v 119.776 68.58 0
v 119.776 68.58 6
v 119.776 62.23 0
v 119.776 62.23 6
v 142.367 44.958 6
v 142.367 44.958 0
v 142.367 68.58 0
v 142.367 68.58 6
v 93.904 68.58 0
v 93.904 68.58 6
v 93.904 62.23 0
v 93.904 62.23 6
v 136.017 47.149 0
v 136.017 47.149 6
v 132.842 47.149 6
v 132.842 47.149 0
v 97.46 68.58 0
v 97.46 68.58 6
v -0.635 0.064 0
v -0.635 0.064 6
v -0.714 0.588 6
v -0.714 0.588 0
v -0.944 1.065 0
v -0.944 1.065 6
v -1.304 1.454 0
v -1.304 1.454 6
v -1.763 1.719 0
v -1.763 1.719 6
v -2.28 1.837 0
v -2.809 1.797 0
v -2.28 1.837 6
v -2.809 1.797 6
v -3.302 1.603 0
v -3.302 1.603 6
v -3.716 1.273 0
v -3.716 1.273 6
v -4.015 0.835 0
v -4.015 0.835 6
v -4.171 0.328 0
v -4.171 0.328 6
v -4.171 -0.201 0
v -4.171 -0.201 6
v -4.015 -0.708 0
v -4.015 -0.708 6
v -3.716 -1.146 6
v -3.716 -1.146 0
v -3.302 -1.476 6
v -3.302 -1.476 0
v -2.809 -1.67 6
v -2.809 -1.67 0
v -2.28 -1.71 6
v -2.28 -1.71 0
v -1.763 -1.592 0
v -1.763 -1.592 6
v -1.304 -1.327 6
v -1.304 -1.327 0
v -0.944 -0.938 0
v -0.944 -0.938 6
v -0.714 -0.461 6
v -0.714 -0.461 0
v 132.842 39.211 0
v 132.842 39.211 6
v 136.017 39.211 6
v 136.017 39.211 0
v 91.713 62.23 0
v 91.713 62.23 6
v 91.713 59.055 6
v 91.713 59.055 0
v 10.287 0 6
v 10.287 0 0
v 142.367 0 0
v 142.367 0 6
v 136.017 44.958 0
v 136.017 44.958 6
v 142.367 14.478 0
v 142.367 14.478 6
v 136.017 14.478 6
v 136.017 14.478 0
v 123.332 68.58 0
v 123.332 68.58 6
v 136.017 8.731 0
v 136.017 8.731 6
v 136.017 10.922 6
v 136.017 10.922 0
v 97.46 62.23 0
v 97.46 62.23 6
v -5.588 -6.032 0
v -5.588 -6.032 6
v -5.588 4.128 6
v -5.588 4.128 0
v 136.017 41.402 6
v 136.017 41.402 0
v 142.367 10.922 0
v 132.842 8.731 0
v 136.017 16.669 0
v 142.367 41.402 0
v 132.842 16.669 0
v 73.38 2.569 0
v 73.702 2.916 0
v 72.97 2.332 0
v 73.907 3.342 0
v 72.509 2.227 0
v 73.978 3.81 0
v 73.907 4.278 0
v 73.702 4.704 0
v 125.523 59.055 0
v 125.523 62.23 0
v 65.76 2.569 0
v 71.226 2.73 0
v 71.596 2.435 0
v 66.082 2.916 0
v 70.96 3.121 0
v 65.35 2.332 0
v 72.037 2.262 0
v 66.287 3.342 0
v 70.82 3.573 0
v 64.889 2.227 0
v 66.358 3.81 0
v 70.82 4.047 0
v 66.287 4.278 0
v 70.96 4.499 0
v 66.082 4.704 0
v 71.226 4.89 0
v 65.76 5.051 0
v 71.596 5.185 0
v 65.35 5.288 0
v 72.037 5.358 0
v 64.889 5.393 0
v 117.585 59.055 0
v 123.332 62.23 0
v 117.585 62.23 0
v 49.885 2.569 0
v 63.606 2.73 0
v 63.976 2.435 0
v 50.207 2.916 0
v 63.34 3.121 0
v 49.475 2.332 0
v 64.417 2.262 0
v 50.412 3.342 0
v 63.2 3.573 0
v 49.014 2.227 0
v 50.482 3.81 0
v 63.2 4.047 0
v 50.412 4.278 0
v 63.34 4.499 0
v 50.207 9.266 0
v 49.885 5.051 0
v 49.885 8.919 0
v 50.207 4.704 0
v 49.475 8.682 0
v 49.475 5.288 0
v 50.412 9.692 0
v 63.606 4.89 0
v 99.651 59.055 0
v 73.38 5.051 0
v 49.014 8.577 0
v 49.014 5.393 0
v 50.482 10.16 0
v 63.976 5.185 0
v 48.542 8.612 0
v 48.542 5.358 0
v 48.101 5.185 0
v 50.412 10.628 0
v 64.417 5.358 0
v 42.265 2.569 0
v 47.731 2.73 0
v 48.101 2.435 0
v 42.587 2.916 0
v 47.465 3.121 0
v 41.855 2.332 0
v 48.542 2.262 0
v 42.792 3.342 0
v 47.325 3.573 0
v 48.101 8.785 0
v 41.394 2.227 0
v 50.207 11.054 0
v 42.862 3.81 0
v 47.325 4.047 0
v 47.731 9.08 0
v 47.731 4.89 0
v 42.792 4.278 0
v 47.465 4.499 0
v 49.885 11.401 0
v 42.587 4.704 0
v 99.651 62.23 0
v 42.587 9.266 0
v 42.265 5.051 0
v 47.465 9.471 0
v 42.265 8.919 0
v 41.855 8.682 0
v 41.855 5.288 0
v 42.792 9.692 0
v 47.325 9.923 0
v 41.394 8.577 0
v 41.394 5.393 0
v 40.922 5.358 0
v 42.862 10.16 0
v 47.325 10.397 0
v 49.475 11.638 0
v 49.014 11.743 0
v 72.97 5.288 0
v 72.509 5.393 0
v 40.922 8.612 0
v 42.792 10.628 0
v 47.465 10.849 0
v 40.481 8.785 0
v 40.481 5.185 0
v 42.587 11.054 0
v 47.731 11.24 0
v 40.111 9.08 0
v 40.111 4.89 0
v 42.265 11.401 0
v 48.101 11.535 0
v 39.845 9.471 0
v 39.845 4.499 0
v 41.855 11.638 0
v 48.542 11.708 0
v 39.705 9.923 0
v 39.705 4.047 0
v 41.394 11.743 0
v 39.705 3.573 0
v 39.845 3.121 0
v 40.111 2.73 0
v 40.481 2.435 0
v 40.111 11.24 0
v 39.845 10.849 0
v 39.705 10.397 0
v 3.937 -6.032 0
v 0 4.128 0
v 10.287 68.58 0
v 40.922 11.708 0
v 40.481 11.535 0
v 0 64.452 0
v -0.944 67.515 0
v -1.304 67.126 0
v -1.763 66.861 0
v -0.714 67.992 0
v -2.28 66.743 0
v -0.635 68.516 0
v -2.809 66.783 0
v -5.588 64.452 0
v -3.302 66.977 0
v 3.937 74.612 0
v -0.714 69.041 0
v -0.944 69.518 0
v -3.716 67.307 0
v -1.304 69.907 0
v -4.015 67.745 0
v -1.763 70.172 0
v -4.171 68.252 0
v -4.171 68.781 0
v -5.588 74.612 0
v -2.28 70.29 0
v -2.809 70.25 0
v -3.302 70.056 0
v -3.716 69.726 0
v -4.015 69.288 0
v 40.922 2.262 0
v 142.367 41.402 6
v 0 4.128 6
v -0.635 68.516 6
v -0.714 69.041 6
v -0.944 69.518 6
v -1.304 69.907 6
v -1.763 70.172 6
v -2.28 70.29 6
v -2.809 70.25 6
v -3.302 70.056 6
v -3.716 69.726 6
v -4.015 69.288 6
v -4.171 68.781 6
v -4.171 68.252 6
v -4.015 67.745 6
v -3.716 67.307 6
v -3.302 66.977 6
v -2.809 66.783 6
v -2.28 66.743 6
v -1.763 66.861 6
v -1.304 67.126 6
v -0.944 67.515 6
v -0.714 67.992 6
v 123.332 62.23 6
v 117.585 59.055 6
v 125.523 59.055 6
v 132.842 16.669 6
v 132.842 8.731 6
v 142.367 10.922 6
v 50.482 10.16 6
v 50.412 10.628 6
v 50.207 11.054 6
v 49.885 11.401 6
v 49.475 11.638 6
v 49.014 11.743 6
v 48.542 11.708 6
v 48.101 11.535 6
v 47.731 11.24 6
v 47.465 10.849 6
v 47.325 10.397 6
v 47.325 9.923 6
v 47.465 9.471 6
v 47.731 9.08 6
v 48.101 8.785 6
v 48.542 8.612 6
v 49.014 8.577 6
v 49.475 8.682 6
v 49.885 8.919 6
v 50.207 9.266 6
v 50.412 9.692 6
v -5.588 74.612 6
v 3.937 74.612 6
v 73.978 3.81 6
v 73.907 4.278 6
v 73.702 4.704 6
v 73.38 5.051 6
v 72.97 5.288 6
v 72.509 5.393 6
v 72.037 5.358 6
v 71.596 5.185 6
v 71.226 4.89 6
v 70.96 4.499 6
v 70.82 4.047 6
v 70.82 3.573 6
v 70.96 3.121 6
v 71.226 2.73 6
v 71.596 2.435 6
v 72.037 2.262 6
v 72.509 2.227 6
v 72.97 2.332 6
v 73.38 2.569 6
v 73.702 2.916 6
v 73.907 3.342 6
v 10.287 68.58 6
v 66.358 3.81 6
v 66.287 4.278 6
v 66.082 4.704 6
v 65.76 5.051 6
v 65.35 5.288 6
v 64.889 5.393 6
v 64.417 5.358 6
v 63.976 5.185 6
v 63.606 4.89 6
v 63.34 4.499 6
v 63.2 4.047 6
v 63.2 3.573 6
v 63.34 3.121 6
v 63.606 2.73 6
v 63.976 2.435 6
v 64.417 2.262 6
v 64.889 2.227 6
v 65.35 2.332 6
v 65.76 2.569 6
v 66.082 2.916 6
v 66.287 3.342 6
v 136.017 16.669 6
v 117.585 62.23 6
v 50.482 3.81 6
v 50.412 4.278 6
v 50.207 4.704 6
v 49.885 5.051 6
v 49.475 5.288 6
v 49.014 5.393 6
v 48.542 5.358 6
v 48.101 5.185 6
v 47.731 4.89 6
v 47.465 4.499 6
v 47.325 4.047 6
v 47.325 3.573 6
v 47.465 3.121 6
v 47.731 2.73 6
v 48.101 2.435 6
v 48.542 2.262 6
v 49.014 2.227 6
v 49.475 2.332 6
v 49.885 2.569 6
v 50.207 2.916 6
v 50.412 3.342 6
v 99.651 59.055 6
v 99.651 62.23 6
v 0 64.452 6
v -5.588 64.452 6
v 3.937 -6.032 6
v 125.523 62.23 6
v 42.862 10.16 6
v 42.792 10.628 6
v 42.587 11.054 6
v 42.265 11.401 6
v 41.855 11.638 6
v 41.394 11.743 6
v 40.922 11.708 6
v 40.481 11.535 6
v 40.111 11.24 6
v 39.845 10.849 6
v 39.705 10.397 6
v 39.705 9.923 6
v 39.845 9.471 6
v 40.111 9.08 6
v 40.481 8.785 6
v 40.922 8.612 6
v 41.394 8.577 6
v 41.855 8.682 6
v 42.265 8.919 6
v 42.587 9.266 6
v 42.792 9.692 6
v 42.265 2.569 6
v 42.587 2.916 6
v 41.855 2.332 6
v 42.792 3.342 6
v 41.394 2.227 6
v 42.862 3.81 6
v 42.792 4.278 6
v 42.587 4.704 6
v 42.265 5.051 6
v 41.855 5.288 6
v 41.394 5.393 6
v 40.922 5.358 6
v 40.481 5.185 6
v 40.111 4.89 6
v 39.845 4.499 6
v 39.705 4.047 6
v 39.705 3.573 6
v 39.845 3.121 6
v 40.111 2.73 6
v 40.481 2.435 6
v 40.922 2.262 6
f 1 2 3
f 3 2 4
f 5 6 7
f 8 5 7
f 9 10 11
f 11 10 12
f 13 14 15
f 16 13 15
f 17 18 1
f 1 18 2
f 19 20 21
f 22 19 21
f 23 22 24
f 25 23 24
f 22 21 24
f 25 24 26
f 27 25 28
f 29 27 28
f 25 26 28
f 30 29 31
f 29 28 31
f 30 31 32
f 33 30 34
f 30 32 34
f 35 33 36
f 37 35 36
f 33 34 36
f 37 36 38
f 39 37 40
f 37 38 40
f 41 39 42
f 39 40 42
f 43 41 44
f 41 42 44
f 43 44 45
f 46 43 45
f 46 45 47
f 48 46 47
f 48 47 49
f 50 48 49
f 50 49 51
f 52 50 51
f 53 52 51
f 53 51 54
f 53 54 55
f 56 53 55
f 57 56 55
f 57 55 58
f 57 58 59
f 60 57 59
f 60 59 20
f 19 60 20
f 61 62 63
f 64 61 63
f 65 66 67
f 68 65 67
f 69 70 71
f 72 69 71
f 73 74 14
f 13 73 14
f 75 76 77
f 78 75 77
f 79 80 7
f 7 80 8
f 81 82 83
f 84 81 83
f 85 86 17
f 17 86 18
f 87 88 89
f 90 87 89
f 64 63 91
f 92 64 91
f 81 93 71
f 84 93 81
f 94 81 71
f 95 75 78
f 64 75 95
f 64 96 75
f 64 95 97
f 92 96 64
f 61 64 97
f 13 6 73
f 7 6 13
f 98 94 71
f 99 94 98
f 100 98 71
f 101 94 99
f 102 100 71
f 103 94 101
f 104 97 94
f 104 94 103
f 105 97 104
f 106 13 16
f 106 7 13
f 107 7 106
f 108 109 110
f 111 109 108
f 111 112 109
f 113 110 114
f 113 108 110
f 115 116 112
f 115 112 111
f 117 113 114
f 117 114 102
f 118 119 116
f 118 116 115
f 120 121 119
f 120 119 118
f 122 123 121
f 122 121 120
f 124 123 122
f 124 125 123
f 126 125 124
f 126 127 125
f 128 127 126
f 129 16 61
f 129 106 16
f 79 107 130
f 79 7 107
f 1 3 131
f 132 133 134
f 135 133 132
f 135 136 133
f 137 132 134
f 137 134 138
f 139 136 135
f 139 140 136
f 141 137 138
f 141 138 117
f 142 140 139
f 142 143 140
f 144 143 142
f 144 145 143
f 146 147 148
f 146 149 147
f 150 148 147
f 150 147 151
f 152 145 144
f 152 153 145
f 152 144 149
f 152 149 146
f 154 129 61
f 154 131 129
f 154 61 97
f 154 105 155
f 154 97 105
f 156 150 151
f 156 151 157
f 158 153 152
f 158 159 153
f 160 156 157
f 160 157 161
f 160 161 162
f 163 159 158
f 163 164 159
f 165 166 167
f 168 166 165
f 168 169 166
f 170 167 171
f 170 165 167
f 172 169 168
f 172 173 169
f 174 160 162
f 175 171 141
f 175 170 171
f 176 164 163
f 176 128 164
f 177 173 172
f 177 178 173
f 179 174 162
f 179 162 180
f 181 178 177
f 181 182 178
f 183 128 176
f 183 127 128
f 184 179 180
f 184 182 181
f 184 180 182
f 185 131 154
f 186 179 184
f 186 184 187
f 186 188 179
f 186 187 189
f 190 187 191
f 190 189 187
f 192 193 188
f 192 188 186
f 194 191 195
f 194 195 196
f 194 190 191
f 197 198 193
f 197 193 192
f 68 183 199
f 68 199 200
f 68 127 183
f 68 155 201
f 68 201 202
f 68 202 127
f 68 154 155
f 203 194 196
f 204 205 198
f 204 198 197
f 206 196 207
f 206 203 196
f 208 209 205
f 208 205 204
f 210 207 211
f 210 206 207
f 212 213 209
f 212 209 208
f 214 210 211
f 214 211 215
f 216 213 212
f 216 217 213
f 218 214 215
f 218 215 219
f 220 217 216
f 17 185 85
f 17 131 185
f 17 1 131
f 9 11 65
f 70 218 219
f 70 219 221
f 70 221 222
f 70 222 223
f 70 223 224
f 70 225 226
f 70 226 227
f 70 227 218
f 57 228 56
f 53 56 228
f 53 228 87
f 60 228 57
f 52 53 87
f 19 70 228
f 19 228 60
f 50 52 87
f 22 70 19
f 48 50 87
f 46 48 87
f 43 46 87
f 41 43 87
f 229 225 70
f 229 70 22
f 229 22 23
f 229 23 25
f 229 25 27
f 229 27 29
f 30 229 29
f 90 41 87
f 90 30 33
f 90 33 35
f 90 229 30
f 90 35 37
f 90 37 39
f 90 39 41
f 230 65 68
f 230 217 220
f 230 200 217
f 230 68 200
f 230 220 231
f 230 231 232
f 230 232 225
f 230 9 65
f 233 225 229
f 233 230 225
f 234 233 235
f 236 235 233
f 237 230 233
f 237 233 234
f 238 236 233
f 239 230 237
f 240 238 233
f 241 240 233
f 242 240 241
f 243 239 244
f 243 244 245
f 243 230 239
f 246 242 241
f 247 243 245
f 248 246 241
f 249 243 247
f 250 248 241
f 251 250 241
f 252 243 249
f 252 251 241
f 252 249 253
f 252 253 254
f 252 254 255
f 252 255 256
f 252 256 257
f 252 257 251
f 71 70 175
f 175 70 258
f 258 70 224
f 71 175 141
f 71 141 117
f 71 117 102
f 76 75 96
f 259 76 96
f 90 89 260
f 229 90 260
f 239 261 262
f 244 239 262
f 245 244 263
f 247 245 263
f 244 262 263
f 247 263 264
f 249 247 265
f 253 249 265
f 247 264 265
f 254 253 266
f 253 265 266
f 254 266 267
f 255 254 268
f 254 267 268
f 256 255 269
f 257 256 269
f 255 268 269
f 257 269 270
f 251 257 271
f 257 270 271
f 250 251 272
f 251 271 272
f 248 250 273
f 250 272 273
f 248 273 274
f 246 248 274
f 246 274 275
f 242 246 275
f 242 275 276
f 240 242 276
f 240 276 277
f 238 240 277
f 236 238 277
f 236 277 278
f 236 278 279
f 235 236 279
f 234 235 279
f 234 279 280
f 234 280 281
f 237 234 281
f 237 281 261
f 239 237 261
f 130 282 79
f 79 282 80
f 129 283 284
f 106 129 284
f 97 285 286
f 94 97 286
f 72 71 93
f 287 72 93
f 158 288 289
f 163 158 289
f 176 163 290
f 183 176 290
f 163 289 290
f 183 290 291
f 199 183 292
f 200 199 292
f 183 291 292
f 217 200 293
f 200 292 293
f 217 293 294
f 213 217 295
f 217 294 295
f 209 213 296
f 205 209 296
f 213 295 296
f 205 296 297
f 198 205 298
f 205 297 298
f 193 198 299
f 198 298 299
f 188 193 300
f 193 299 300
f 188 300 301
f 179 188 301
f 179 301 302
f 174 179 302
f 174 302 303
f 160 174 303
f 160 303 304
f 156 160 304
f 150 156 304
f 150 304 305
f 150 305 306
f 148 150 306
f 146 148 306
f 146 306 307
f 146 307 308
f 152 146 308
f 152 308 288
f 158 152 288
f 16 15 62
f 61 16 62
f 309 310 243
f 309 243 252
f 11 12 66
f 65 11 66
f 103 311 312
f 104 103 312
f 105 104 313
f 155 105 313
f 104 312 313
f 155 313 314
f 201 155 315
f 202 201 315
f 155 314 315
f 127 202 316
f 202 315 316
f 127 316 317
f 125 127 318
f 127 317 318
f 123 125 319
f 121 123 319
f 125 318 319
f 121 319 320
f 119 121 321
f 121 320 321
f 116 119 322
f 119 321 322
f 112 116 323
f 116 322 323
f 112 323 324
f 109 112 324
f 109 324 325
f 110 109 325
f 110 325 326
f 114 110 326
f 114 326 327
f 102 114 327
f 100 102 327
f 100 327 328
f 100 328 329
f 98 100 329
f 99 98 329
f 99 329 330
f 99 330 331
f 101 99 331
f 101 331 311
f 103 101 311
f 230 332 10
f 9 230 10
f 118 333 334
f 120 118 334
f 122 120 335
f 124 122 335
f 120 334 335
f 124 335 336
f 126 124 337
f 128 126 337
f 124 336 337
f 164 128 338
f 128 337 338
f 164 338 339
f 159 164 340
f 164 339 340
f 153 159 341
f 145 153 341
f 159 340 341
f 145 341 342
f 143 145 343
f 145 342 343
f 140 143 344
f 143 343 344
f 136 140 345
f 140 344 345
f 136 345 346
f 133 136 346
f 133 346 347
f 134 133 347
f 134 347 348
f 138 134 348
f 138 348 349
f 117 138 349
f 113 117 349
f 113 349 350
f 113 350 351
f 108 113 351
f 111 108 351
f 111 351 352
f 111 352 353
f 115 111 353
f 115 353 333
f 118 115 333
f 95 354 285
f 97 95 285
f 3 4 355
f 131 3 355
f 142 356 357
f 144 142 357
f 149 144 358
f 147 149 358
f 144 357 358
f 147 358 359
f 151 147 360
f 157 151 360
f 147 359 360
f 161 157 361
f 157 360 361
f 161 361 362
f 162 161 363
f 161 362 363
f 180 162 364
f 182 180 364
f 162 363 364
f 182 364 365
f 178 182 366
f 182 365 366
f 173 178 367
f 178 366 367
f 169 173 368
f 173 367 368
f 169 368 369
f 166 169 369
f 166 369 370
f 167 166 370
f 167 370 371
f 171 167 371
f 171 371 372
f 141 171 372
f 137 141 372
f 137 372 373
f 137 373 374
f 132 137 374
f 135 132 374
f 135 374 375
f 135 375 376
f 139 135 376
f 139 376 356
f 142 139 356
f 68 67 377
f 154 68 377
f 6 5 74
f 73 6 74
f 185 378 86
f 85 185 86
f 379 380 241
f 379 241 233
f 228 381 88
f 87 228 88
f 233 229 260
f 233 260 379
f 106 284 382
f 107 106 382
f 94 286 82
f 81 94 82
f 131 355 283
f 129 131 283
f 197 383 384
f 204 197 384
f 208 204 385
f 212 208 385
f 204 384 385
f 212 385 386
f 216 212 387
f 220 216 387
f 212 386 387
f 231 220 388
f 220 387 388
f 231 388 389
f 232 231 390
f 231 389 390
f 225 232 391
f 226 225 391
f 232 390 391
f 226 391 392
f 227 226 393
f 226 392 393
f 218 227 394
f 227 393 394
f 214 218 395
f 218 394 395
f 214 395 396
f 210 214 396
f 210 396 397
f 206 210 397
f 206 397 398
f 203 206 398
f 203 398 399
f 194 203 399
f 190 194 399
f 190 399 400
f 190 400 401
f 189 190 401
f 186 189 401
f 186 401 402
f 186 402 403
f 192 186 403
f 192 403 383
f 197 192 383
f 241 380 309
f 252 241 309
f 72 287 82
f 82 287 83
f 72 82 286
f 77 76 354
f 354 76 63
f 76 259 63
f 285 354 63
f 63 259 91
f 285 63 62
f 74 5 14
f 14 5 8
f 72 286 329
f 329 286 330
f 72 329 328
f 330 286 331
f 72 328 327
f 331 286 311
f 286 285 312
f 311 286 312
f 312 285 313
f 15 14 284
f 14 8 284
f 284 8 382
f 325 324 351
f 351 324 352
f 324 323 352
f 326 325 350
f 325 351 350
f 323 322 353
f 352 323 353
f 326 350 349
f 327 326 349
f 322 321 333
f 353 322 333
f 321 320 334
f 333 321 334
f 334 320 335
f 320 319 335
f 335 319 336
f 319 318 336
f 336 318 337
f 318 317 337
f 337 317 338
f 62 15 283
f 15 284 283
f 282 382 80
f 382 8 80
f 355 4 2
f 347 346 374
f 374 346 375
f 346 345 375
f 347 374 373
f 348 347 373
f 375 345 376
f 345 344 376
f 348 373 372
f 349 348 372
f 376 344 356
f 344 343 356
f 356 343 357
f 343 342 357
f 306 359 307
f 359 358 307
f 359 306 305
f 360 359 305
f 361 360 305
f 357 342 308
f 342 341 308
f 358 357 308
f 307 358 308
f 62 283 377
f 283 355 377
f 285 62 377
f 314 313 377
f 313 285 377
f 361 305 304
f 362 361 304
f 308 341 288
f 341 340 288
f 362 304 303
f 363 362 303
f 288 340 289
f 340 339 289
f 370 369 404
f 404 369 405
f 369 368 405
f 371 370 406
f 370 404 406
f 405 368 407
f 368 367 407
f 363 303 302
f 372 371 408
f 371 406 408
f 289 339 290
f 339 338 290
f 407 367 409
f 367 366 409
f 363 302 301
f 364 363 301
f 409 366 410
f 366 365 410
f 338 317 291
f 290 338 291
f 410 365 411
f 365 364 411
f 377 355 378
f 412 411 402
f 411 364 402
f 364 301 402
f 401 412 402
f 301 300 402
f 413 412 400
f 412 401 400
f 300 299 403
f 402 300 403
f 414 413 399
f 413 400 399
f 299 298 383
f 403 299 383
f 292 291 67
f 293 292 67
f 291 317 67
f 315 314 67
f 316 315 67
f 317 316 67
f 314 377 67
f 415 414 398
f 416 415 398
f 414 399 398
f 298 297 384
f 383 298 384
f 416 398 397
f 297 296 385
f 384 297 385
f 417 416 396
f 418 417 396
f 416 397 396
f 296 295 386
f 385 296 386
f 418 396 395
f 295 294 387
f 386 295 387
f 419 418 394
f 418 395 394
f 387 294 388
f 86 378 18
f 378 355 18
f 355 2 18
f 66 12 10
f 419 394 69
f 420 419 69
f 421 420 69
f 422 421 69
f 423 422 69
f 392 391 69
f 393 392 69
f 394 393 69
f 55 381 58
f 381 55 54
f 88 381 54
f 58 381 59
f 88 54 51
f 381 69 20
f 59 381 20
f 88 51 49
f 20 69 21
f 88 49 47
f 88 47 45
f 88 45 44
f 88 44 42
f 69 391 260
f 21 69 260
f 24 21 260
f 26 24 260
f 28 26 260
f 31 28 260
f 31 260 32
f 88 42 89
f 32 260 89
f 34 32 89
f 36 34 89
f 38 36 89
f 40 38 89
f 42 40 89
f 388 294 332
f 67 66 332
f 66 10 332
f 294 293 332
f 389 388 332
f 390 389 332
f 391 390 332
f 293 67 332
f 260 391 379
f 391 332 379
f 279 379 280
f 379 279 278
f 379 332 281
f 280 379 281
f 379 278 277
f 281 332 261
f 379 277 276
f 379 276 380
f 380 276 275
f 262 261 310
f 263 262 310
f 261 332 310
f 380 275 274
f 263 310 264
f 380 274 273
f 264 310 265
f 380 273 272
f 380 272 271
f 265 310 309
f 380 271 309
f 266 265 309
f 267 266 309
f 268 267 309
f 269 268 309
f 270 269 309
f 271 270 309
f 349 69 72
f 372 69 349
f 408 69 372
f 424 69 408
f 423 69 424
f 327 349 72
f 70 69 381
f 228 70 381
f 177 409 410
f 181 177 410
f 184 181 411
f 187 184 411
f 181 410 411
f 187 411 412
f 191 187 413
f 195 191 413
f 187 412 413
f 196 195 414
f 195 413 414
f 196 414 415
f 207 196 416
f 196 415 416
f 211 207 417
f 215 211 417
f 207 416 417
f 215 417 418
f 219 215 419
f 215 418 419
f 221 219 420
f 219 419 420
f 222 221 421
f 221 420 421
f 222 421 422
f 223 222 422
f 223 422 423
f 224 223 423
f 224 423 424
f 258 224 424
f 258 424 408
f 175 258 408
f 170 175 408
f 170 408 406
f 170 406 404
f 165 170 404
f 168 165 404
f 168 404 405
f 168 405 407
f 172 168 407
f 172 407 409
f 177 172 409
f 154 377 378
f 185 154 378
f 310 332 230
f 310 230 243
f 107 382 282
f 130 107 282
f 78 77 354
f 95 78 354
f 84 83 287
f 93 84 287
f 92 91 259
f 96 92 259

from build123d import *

# Parameters (mm, degrees)
SKETCH1_W           = 142.367
SKETCH1_H           = 68.58
BOSS_EXTRUDE1_DEPTH = 6
SKETCH2_W           = 5.588
SKETCH2_H           = 4.1275
BOSS_EXTRUDE2_DEPTH = 6
BOSS_EXTRUDE3_DEPTH = 6
CUT_EXTRUDE1_DEPTH  = 160.827015204
BOSS_EXTRUDE4_DEPTH = 6
SKETCH6_R           = 1.778
SKETCH6_R_2         = 1.5875
CUT_EXTRUDE2_DEPTH  = 161.845851191


with BuildPart() as part:
    # Sketch1 → Boss-Extrude1 (new body)
    with BuildSketch(Plane.XY):
        with Locations((71.1835, 34.29)):
            Rectangle(SKETCH1_W, SKETCH1_H)
    extrude(amount=BOSS_EXTRUDE1_DEPTH)

    # Sketch2 → Boss-Extrude2 (add)
    with BuildSketch(Plane.XY.offset(6)):
        with Locations((-2.794, 66.51625)):
            Rectangle(SKETCH2_W, SKETCH2_H)
        with Locations((-2.794, 2.06375)):
            Rectangle(SKETCH2_W, SKETCH2_H)
    extrude(amount=-BOSS_EXTRUDE2_DEPTH)

    # Sketch3 → Boss-Extrude3 (add)
    with BuildSketch(Plane.XY.offset(6)):
        Polygon((0, 68.58), (0, 72.39), (2.54, 72.39), (9.525, 68.58), align=None)
        Polygon((0, 0), (0, -3.81), (2.54, -3.81), (9.525, 0), align=None)
    extrude(amount=-BOSS_EXTRUDE3_DEPTH)

    # Sketch4 → Cut-Extrude1 (cut, through all)
    with BuildSketch(Plane.XY.offset(6)):
        Polygon((142.367, 44.958), (136.017, 44.958), (136.017, 47.14875), (132.842, 47.14875), (132.842, 39.21125), (136.017, 39.21125), (136.017, 41.402), (142.367, 41.402), align=None)
        Polygon((142.367, 14.478), (136.017, 14.478), (136.017, 16.66875), (132.842, 16.66875), (132.842, 8.73125), (136.017, 8.73125), (136.017, 10.922), (142.367, 10.922), align=None)
        Polygon((93.9038, 62.23), (91.71305, 62.23), (91.71305, 59.055), (99.65055, 59.055), (99.65055, 62.23), (97.4598, 62.23), (97.4598, 68.58), (93.9038, 68.58), align=None)
        Polygon((123.33224, 68.58), (119.77624, 68.58), (119.77624, 62.23), (117.58549, 62.23), (117.58549, 59.055), (125.52299, 59.055), (125.52299, 62.23), (123.33224, 62.23), align=None)
    extrude(amount=-CUT_EXTRUDE1_DEPTH, mode=Mode.SUBTRACT)

    # Sketch5 → Boss-Extrude4 (add)
    with BuildSketch(Plane.XY.offset(6)):
        Polygon((10.287, 0), (3.937, -6.0325), (-5.588, -6.0325), (-5.588, 0), align=None)
        Polygon((-5.588, 68.58), (10.287, 68.58), (3.937, 74.6125), (-5.588, 74.6125), align=None)
    extrude(amount=-BOSS_EXTRUDE4_DEPTH)

    # Sketch6 → Cut-Extrude2 (cut, through all)
    with BuildSketch(Plane.XY.offset(6)):
        with Locations((-2.413, 68.5165)):
            Circle(SKETCH6_R)
        with Locations((-2.413, 0.0635)):
            Circle(SKETCH6_R)
        with Locations((64.77, 3.81)):
            Circle(SKETCH6_R_2)
        with Locations((72.39, 3.81)):
            Circle(SKETCH6_R_2)
        with Locations((41.275, 3.81)):
            Circle(SKETCH6_R_2)
        with Locations((48.895, 3.81)):
            Circle(SKETCH6_R_2)
        with Locations((41.275, 10.16)):
            Circle(SKETCH6_R_2)
        with Locations((48.895, 10.16)):
            Circle(SKETCH6_R_2)
    extrude(amount=-CUT_EXTRUDE2_DEPTH, mode=Mode.SUBTRACT)


solid = part.part
